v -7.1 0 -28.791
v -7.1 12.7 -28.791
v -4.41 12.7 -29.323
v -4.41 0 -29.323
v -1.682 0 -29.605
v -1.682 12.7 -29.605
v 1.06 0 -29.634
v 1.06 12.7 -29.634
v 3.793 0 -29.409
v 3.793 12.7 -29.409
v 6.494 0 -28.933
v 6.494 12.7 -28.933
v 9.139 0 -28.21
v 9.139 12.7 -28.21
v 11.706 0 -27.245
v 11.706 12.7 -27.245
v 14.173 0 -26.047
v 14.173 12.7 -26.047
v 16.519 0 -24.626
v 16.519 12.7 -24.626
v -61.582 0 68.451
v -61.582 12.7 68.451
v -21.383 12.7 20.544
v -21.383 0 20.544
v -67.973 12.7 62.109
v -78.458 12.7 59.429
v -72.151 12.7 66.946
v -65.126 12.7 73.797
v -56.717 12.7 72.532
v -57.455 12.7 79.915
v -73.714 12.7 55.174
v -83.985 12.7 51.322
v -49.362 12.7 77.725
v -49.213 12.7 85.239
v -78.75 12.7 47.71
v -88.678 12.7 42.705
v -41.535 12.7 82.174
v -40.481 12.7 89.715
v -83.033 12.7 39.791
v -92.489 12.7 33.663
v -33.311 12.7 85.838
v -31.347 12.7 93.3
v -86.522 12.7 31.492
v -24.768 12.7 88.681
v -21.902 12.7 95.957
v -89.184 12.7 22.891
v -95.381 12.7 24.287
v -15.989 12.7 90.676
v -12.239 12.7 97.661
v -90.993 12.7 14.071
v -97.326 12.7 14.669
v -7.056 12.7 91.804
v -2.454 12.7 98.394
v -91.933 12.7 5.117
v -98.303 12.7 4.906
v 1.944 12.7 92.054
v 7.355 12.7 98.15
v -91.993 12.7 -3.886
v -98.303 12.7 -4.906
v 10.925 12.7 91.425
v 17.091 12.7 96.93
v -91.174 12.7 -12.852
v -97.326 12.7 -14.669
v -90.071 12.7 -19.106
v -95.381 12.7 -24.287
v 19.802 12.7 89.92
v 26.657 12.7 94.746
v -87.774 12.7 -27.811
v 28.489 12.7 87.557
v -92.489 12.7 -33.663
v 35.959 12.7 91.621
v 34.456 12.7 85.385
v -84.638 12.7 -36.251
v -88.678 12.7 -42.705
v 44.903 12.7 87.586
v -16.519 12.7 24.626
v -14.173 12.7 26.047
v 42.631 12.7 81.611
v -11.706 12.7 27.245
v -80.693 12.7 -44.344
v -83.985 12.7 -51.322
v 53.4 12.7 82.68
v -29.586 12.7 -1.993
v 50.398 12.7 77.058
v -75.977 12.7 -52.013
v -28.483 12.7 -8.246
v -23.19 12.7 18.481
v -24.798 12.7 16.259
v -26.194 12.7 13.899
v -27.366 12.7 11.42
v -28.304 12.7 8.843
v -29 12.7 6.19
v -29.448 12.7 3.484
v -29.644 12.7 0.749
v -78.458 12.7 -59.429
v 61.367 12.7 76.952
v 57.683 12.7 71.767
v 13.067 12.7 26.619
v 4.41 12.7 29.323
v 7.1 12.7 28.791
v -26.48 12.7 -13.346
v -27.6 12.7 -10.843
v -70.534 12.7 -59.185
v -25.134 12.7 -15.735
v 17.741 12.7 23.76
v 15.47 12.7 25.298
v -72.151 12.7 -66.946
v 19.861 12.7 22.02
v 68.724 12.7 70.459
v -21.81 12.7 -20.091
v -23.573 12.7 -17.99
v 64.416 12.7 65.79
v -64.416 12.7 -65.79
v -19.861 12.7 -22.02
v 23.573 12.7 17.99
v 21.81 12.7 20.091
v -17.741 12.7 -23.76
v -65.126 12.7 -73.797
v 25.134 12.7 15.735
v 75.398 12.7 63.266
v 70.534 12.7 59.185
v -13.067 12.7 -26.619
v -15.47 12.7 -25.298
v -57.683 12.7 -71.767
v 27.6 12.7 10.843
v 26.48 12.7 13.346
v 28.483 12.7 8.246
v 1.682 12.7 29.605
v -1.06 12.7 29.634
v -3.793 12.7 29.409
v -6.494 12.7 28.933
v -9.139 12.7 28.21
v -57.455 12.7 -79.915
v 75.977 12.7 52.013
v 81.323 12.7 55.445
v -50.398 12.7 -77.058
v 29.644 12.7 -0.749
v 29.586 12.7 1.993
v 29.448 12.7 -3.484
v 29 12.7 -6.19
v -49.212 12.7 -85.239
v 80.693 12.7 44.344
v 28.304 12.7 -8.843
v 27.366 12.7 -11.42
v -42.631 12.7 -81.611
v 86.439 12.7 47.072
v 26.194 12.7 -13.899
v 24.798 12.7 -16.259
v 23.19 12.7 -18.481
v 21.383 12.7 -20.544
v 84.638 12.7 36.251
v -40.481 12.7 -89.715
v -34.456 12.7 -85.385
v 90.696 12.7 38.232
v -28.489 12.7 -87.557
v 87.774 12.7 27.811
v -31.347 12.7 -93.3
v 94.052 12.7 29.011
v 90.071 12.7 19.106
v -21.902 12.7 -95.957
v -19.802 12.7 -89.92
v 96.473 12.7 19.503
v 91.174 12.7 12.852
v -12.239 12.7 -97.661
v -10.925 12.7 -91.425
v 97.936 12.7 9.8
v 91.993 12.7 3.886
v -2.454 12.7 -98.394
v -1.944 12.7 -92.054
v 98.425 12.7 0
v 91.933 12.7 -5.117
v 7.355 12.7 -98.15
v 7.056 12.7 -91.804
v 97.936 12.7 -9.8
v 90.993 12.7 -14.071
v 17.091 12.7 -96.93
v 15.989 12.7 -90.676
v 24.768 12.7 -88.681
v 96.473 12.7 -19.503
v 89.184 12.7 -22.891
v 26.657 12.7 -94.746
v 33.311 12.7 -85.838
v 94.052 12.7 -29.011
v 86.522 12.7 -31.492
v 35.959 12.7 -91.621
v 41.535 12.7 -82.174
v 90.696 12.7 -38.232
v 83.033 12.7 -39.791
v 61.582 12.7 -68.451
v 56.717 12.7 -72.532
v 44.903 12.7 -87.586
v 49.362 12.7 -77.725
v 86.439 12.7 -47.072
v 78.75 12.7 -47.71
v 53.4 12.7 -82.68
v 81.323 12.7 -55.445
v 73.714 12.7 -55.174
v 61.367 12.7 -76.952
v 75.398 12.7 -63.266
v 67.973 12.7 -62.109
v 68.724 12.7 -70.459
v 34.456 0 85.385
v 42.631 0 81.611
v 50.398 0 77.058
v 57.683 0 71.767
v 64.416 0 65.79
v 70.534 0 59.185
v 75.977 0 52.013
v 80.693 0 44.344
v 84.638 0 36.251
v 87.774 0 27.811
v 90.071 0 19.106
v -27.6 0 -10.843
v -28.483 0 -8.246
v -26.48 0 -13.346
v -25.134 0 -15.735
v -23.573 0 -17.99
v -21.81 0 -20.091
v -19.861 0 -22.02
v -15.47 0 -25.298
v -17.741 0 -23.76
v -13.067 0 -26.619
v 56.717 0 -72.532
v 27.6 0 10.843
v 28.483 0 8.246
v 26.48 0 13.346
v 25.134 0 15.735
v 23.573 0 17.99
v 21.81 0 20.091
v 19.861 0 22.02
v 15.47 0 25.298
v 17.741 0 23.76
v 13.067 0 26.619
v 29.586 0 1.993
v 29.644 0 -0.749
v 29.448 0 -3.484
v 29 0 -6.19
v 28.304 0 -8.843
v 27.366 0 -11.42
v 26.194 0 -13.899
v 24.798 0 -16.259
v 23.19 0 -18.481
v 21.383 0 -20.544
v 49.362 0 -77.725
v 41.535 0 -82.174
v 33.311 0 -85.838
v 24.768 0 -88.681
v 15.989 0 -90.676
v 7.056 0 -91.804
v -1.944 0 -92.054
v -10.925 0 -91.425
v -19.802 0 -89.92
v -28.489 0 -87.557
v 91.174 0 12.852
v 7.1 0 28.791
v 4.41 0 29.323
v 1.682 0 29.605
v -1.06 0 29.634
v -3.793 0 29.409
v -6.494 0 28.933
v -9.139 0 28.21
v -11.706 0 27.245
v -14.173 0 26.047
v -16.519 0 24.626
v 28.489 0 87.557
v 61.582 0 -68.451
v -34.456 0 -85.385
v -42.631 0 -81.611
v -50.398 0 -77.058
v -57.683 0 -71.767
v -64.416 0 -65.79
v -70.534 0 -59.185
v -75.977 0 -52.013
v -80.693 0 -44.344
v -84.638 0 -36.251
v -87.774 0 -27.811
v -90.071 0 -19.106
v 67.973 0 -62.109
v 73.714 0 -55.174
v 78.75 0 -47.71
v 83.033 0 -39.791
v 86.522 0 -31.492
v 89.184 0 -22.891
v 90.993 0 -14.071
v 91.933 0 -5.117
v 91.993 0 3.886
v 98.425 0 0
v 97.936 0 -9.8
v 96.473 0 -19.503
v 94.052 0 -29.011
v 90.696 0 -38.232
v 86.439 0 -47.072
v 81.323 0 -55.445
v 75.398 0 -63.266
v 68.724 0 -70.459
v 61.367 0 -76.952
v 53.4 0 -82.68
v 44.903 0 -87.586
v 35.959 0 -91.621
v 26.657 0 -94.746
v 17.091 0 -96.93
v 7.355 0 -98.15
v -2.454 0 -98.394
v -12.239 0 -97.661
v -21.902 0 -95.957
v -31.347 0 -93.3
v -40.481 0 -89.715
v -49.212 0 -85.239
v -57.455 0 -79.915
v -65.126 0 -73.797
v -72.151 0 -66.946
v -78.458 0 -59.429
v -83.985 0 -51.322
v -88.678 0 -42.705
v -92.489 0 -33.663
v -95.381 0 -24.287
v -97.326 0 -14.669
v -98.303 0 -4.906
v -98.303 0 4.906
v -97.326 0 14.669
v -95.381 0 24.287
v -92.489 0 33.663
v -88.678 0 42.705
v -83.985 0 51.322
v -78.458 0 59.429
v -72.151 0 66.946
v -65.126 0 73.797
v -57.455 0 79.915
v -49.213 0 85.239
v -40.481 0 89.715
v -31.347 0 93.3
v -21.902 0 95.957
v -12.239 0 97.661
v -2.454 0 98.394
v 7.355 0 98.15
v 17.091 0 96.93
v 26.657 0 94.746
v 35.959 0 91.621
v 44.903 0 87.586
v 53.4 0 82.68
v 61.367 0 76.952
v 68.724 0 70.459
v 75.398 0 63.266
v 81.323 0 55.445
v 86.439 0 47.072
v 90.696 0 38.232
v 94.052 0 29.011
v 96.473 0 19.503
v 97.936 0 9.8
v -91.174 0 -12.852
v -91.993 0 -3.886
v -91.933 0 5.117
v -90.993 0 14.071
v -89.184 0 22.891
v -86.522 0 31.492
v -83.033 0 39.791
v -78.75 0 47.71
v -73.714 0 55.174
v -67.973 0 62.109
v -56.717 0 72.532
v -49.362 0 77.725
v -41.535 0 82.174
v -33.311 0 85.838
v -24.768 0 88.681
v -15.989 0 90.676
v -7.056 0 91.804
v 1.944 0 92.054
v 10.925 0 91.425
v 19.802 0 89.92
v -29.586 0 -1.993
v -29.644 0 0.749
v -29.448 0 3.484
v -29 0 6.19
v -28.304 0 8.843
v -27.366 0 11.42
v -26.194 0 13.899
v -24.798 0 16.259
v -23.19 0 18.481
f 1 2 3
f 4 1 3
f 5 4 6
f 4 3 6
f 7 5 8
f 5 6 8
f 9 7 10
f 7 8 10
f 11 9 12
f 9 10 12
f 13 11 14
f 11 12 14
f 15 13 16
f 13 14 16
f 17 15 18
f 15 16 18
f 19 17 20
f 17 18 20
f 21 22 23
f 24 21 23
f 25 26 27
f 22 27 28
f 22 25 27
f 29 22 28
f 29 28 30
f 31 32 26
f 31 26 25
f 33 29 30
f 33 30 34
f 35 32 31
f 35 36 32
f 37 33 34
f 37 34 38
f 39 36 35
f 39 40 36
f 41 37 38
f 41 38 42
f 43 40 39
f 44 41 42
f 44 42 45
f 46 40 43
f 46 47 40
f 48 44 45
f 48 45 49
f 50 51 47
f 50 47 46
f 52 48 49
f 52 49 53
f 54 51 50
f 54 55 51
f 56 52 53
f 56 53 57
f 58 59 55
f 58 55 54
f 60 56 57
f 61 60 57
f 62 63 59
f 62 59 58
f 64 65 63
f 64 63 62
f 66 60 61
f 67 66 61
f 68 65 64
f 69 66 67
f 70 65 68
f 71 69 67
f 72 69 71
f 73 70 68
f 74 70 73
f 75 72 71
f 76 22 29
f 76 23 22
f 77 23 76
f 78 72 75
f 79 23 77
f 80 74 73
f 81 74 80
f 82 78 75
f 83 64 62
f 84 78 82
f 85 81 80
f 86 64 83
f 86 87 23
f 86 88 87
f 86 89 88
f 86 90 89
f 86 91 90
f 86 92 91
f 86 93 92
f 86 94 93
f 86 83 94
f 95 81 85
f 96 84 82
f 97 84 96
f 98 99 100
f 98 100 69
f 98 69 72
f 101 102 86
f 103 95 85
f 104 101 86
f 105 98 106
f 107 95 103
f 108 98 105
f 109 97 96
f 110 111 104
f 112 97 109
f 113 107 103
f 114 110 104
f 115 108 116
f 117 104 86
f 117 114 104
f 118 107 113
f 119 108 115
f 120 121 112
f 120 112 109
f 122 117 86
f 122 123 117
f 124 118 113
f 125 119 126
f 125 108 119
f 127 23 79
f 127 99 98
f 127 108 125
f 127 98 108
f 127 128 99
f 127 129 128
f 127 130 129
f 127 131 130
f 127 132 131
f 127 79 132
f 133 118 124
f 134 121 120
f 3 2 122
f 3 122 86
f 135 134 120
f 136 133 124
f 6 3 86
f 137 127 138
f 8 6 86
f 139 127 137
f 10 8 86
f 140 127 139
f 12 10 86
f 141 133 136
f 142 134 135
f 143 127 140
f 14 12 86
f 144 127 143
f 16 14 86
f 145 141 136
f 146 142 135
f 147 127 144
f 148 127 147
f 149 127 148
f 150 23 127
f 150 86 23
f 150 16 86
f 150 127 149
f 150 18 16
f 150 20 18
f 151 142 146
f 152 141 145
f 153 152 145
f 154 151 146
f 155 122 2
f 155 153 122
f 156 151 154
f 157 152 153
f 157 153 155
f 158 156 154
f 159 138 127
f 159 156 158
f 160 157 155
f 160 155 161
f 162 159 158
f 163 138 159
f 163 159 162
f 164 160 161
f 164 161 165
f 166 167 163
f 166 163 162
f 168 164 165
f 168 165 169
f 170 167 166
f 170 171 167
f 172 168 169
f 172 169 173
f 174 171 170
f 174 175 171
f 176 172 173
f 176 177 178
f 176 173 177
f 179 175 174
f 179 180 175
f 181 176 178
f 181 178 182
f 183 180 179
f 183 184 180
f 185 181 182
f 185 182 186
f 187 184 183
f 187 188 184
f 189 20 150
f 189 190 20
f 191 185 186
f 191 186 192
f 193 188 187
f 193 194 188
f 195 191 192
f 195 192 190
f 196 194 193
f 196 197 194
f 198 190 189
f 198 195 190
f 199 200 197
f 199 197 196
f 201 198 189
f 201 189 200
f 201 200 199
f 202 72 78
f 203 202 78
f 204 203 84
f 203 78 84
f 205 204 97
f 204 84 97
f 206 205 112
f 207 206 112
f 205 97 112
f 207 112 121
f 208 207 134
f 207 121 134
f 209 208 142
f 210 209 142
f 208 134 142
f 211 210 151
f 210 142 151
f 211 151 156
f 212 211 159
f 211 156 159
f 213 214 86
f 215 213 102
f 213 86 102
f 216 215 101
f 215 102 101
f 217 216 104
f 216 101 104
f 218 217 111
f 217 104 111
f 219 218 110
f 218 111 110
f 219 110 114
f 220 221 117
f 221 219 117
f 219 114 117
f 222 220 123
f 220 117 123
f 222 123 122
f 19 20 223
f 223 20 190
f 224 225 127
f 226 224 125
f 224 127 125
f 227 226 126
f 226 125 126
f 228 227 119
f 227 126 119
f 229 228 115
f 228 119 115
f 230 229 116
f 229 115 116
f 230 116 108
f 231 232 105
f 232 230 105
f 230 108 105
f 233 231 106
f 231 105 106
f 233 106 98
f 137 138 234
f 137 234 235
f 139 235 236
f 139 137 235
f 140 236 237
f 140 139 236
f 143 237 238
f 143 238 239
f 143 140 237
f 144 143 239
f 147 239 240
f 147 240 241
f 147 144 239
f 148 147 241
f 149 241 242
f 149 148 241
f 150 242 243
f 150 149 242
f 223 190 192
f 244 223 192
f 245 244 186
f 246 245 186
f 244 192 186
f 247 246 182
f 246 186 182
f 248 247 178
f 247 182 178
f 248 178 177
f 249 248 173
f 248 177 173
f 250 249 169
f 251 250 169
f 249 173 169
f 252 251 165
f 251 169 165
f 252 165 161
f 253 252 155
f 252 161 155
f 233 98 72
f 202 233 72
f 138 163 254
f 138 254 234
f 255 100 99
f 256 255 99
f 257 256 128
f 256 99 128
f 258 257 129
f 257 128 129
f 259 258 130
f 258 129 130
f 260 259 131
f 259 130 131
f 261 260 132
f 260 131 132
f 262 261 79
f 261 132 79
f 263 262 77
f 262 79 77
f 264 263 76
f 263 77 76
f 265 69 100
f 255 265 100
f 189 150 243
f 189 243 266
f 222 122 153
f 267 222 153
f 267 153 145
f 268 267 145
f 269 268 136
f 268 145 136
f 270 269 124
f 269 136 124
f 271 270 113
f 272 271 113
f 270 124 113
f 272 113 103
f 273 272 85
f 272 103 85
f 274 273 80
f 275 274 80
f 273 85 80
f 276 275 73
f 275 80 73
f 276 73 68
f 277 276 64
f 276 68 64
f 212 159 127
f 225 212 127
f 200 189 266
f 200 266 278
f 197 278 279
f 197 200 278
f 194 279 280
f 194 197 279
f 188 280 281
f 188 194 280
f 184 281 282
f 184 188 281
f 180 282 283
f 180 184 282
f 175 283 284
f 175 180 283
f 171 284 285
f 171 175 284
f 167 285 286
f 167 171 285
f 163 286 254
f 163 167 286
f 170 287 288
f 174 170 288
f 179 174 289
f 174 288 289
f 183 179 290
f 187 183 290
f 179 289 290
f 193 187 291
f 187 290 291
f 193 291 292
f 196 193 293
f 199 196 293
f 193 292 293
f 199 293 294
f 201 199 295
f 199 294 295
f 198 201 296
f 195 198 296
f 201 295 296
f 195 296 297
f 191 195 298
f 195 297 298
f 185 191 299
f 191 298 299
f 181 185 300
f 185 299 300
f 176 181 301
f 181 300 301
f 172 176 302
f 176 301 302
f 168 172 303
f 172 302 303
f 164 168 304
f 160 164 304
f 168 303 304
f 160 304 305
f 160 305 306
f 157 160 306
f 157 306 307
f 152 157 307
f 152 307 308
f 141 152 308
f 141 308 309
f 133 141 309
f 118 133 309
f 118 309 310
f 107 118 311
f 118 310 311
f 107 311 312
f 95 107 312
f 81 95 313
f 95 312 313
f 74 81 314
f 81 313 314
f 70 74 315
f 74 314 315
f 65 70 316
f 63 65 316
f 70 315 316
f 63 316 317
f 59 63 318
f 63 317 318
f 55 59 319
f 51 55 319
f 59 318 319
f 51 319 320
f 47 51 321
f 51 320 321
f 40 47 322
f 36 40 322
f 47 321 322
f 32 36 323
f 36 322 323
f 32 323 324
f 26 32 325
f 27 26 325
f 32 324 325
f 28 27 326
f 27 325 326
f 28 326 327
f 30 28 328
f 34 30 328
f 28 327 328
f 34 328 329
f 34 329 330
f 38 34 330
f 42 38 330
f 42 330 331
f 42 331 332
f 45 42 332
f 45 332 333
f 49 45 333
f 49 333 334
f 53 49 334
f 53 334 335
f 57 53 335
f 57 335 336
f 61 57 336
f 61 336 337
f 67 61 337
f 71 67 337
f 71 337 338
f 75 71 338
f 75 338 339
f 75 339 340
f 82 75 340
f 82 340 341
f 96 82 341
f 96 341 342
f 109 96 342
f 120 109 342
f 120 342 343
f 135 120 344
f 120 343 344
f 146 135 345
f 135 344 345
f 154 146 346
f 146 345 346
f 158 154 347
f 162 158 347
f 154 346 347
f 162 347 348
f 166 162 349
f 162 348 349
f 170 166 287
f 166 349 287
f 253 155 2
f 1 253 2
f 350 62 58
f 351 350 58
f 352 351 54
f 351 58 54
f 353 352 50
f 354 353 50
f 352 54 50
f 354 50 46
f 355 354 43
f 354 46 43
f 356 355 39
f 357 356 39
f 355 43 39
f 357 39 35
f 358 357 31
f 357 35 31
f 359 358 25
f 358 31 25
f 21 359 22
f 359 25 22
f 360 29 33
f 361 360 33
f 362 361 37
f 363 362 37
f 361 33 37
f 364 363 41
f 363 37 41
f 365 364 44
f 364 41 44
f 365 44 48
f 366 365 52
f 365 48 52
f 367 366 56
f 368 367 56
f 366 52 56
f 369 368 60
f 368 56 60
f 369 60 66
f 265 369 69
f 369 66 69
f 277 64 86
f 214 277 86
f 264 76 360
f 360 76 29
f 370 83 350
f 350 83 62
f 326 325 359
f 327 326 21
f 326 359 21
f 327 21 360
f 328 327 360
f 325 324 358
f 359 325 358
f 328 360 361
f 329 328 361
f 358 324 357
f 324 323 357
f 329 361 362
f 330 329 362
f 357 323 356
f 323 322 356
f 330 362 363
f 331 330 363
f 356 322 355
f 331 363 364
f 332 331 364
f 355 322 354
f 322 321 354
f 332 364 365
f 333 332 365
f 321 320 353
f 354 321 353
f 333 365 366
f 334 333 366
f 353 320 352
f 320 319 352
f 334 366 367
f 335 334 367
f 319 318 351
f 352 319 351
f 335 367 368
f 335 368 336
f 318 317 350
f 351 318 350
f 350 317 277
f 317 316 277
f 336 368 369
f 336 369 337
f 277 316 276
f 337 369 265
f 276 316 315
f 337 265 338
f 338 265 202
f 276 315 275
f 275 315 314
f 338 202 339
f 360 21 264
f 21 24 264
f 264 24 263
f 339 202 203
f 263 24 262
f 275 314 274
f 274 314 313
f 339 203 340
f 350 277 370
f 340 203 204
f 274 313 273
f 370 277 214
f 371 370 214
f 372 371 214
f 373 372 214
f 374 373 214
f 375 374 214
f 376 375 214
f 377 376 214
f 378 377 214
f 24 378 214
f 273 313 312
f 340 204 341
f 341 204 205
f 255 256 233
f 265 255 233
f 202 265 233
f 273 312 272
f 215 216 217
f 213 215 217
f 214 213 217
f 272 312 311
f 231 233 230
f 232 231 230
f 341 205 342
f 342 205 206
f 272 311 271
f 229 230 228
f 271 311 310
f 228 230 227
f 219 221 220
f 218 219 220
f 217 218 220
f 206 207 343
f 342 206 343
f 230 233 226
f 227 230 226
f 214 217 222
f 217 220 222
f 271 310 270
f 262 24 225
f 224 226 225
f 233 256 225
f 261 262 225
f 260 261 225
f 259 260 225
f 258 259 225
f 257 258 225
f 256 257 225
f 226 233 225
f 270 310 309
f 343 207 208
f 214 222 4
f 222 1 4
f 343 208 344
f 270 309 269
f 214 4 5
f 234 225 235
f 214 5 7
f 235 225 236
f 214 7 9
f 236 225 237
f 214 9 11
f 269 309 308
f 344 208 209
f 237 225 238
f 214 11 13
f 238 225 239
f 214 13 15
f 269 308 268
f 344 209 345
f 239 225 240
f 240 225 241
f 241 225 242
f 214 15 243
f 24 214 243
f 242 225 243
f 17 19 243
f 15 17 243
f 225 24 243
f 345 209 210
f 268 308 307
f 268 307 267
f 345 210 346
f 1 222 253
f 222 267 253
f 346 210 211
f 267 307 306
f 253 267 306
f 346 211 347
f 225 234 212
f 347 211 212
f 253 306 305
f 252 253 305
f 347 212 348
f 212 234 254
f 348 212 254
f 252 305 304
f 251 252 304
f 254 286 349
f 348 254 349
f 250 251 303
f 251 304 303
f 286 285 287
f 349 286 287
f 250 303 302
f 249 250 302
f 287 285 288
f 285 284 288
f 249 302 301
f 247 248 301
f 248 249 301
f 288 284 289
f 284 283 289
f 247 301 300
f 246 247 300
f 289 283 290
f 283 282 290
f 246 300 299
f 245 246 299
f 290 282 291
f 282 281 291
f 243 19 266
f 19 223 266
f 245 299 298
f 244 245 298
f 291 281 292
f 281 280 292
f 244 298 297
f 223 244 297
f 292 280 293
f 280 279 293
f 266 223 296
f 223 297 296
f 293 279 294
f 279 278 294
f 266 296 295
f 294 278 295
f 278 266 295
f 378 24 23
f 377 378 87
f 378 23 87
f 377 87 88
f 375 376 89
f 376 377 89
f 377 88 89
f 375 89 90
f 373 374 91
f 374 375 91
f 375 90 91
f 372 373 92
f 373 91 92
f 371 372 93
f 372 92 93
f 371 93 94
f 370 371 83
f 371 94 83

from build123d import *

# Parameters (mm, degrees)
SKETCH1_R           = 98.425
BOSS_EXTRUDE1_DEPTH = 12.7
CUT_EXTRUDE1_DEPTH  = 13.7


with BuildPart() as part:
    # Sketch1 → Boss-Extrude1 (new body)
    with BuildSketch(Plane(origin=(0, 0, 0), x_dir=(1, 0, 0), z_dir=(0, 1, 0))):
        Circle(SKETCH1_R)
    extrude(amount=BOSS_EXTRUDE1_DEPTH)

    # Sketch2 → Cut-Extrude1 (cut, through all)
    with BuildSketch(Plane(origin=(0, 12.7, 0), x_dir=(1, 0, 0), z_dir=(0, 1, 0))):
        with BuildLine():
            Line((21.383254088, 20.544146731), (61.581662722, 68.450744637))
            ThreePointArc((61.581662722, 68.450744637), (86.522198059, 31.491504697), (91.173581053, -12.852382775))
            Line((91.173581053, -12.852382775), (29.586045941, -1.992838659))
            ThreePointArc((29.586045941, -1.992838659), (27.864786272, 10.141952787), (21.383254088, 20.544146731))
        make_face()
        with BuildLine():
            Line((16.518871875, 24.625848052), (56.717280509, 72.532445958))
            ThreePointArc((56.717280509, 72.532445958), (15.988655959, 90.676173859), (-28.489252402, 87.556656643))
            Line((-28.489252402, 87.556656643), (-7.100125924, 28.790514622))
            ThreePointArc((-7.100125924, 28.790514622), (5.149204378, 29.202589176), (16.518871875, 24.625848052))
        make_face()
        with BuildLine():
            Line((-13.067174066, 26.618686712), (-34.456300544, 85.384828733))
            ThreePointArc((-34.456300544, 85.384828733), (-70.5335421, 59.184669162), (-90.070915125, 19.105912006))
            Line((-90.070915125, 19.105912006), (-28.483380012, 8.246367891))
            ThreePointArc((-28.483380012, 8.246367891), (-22.715581894, 19.060636389), (-13.067174066, 26.618686712))
        make_face()
        with BuildLine():
            Line((-29.586045941, 1.992838659), (-91.173581053, 12.852382775))
            ThreePointArc((-91.173581053, 12.852382775), (-86.522198059, -31.491504697), (-61.581662722, -68.450744637))
            Line((-61.581662722, -68.450744637), (-21.383254088, -20.544146731))
            ThreePointArc((-21.383254088, -20.544146731), (-27.864786272, -10.141952787), (-29.586045941, 1.992838659))
        make_face()
        with BuildLine():
            Line((-16.518871875, -24.625848052), (-56.717280509, -72.532445958))
            ThreePointArc((-56.717280509, -72.532445958), (-15.988655959, -90.676173859), (28.489252402, -87.556656643))
            Line((28.489252402, -87.556656643), (7.100125924, -28.790514622))
            ThreePointArc((7.100125924, -28.790514622), (-5.149204378, -29.202589176), (-16.518871875, -24.625848052))
        make_face()
        with BuildLine():
            Line((13.067174066, -26.618686712), (34.456300544, -85.384828733))
            ThreePointArc((34.456300544, -85.384828733), (70.5335421, -59.184669162), (90.070915125, -19.105912006))
            Line((90.070915125, -19.105912006), (28.483380012, -8.246367891))
            ThreePointArc((28.483380012, -8.246367891), (22.715581894, -19.060636389), (13.067174066, -26.618686712))
        make_face()
    extrude(amount=-CUT_EXTRUDE1_DEPTH, mode=Mode.SUBTRACT)


solid = part.part
